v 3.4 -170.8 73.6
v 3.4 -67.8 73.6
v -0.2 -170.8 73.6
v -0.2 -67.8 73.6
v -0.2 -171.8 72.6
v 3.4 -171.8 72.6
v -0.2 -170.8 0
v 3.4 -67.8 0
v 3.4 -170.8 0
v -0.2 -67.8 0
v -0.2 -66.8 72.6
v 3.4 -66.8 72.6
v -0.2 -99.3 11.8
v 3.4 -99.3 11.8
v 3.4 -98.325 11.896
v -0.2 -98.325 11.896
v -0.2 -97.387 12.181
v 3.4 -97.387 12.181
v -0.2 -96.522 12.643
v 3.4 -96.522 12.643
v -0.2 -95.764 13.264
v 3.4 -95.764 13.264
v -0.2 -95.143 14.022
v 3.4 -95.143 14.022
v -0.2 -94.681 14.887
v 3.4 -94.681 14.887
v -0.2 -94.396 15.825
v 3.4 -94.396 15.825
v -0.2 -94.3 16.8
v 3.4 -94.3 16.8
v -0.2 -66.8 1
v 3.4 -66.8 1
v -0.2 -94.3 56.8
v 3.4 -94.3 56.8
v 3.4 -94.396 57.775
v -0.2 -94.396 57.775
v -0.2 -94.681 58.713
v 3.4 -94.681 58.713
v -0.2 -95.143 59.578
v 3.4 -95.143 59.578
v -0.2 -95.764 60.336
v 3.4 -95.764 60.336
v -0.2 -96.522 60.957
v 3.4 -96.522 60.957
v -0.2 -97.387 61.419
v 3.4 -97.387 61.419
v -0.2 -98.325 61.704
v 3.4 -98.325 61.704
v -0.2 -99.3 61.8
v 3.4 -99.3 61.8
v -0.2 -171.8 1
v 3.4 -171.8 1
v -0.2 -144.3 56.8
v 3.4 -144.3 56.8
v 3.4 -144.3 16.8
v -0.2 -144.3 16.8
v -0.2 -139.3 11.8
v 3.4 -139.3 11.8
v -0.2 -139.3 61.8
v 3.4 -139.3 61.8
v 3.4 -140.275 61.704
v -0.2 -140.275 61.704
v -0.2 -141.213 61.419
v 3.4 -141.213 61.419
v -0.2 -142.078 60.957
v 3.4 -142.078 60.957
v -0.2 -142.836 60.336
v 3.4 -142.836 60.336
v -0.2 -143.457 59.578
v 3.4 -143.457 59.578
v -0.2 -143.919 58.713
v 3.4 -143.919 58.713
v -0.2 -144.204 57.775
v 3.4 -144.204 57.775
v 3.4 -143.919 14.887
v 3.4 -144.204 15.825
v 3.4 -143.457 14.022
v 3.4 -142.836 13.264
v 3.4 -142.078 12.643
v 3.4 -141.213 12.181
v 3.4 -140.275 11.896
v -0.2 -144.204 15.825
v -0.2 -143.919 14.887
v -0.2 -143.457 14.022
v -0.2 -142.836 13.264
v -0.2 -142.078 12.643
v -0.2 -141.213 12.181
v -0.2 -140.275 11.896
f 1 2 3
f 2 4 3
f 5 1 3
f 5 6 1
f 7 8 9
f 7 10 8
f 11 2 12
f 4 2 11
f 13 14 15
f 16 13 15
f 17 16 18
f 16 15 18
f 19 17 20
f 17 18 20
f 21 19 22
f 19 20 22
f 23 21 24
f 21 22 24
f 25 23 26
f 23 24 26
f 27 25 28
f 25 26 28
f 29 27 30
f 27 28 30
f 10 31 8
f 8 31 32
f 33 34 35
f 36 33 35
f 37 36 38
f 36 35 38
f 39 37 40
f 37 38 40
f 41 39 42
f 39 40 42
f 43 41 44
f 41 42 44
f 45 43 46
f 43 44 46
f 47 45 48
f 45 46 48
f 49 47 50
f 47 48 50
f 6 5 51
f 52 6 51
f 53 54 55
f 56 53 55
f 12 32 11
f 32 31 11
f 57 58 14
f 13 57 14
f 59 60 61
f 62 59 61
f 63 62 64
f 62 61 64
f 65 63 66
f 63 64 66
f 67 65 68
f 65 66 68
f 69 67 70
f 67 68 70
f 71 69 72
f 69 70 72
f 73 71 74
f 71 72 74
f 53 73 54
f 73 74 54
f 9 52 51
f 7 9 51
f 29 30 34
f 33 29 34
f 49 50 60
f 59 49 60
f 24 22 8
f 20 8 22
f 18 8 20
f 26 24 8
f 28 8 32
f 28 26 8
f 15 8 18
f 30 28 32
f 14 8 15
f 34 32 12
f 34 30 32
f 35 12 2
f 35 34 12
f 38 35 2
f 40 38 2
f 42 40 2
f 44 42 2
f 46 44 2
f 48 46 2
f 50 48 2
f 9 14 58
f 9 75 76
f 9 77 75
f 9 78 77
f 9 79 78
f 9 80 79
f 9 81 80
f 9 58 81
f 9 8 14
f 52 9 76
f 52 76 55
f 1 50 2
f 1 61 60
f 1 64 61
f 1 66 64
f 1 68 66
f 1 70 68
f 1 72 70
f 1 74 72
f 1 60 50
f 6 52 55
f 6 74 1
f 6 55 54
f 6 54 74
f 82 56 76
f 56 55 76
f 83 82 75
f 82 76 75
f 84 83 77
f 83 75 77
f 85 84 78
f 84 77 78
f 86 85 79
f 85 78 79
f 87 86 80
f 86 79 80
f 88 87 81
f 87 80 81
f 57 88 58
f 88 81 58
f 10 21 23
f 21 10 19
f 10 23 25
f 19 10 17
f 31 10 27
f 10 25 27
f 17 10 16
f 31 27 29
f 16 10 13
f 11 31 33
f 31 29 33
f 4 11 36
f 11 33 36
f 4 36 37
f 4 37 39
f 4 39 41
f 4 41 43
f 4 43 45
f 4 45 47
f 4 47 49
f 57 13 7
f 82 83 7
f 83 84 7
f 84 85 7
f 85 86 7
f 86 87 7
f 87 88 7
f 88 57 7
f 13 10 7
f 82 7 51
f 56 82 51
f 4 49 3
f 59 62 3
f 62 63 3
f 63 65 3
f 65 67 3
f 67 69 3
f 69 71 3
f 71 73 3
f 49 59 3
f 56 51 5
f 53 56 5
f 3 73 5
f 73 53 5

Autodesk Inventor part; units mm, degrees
ref_plane "YZ Plane" through (0, 0, 0) normal (1, 0, 0) x (0, 1, 0)
ref_plane "XZ Plane" through (0, 0, 0) normal (0, 1, 0) x (-1, 0, 0)
ref_plane "XY Plane" through (0, 0, 0) normal (0, 0, 1) x (1, 0, 0)
ref_plane "Work Plane1" through (0, 0, 0) normal (0, 0, 1) x (1, 0, 0)
ref_plane "Work Plane2" through (-0.2, -170, 73.6) normal (1, 0, 0) x (0, 0, 1)
sketch "Sketch2" plane through (-0.2, -170, 73.6) normal (1, 0, 0) x (0, 0, 1)
  line L0 (-73.6, -170) -> (-73.6, 0) projected
  line L1 (0, 1.8) -> (-73.6, 1.8)
  line L2 (-73.6, 1.8) -> (-73.6, -103.2)
  line L3 (-73.6, -103.2) -> (0, -103.2)
  line L4 (0, -103.2) -> (0, 1.8)
  dimension "d0" = 105
extrude "Extrusion1" add sketch "Sketch2" along normal blind 3.6
sketch "Sketch3" plane through (3.4, -170, 73.6) normal (1, 0, 0) x (0, 0, -1)
  line L0 (73.6, -1.8) -> (73.6, 103.2) projected
  line L1 (73.6, 103.2) -> (0, 103.2) projected
  line L2 (0, 103.2) -> (0, -1.8) projected
  line L3 (0, -1.8) -> (73.6, -1.8) projected
  line L4 (73.6, 103.2) -> (0, 103.2) construction
  line L5 (73.6, -1.8) -> (73.6, 103.2) construction
  line L6 (36.8, 103.2) -> (73.6, 103.2) construction
  line L7 (73.6, 103.2) -> (73.6, 50.7) construction
  line L8 (73.6, 50.7) -> (36.8, 50.7) construction
  line L9 (36.8, 50.7) -> (36.8, 103.2) construction
  line L10 (16.8, 25.7) -> (56.8, 25.7)
  line L11 (61.8, 30.7) -> (61.8, 70.7)
  line L12 (56.8, 75.7) -> (16.8, 75.7)
  line L13 (11.8, 70.7) -> (11.8, 30.7)
  line L14 (11.8, 25.7) -> (61.8, 75.7) construction
  line L15 (61.8, 25.7) -> (11.8, 75.7) construction
  arc A0 (16.8, 75.7) -> (11.8, 70.7) centre (16.8, 70.7) ccw
  arc A1 (61.8, 70.7) -> (56.8, 75.7) centre (56.8, 70.7) ccw
  arc A2 (56.8, 25.7) -> (61.8, 30.7) centre (56.8, 30.7) ccw
  arc A3 (11.8, 30.7) -> (16.8, 25.7) centre (16.8, 30.7) ccw
  point P0 (73.6, 170)
  dimension "d3" = 50
  dimension "d4" = 50
  dimension "d5" = 5
extrude "Extrusion2" cut sketch "Sketch3" against normal through all contours A3 L13 A0 L12 A1 L11 A2 L10
chamfer "Chamfer1" distance 1 angle 45 4 edges at (1.6, -66.8, 73.6) (1.6, -171.8, 73.6) (1.6, -66.8, 0) (1.6, -171.8, 0)
equation "\"d1\" = wood_thickness"
equation "\"wood_thickness\" = 3.6"
properties part number "cover_components"
